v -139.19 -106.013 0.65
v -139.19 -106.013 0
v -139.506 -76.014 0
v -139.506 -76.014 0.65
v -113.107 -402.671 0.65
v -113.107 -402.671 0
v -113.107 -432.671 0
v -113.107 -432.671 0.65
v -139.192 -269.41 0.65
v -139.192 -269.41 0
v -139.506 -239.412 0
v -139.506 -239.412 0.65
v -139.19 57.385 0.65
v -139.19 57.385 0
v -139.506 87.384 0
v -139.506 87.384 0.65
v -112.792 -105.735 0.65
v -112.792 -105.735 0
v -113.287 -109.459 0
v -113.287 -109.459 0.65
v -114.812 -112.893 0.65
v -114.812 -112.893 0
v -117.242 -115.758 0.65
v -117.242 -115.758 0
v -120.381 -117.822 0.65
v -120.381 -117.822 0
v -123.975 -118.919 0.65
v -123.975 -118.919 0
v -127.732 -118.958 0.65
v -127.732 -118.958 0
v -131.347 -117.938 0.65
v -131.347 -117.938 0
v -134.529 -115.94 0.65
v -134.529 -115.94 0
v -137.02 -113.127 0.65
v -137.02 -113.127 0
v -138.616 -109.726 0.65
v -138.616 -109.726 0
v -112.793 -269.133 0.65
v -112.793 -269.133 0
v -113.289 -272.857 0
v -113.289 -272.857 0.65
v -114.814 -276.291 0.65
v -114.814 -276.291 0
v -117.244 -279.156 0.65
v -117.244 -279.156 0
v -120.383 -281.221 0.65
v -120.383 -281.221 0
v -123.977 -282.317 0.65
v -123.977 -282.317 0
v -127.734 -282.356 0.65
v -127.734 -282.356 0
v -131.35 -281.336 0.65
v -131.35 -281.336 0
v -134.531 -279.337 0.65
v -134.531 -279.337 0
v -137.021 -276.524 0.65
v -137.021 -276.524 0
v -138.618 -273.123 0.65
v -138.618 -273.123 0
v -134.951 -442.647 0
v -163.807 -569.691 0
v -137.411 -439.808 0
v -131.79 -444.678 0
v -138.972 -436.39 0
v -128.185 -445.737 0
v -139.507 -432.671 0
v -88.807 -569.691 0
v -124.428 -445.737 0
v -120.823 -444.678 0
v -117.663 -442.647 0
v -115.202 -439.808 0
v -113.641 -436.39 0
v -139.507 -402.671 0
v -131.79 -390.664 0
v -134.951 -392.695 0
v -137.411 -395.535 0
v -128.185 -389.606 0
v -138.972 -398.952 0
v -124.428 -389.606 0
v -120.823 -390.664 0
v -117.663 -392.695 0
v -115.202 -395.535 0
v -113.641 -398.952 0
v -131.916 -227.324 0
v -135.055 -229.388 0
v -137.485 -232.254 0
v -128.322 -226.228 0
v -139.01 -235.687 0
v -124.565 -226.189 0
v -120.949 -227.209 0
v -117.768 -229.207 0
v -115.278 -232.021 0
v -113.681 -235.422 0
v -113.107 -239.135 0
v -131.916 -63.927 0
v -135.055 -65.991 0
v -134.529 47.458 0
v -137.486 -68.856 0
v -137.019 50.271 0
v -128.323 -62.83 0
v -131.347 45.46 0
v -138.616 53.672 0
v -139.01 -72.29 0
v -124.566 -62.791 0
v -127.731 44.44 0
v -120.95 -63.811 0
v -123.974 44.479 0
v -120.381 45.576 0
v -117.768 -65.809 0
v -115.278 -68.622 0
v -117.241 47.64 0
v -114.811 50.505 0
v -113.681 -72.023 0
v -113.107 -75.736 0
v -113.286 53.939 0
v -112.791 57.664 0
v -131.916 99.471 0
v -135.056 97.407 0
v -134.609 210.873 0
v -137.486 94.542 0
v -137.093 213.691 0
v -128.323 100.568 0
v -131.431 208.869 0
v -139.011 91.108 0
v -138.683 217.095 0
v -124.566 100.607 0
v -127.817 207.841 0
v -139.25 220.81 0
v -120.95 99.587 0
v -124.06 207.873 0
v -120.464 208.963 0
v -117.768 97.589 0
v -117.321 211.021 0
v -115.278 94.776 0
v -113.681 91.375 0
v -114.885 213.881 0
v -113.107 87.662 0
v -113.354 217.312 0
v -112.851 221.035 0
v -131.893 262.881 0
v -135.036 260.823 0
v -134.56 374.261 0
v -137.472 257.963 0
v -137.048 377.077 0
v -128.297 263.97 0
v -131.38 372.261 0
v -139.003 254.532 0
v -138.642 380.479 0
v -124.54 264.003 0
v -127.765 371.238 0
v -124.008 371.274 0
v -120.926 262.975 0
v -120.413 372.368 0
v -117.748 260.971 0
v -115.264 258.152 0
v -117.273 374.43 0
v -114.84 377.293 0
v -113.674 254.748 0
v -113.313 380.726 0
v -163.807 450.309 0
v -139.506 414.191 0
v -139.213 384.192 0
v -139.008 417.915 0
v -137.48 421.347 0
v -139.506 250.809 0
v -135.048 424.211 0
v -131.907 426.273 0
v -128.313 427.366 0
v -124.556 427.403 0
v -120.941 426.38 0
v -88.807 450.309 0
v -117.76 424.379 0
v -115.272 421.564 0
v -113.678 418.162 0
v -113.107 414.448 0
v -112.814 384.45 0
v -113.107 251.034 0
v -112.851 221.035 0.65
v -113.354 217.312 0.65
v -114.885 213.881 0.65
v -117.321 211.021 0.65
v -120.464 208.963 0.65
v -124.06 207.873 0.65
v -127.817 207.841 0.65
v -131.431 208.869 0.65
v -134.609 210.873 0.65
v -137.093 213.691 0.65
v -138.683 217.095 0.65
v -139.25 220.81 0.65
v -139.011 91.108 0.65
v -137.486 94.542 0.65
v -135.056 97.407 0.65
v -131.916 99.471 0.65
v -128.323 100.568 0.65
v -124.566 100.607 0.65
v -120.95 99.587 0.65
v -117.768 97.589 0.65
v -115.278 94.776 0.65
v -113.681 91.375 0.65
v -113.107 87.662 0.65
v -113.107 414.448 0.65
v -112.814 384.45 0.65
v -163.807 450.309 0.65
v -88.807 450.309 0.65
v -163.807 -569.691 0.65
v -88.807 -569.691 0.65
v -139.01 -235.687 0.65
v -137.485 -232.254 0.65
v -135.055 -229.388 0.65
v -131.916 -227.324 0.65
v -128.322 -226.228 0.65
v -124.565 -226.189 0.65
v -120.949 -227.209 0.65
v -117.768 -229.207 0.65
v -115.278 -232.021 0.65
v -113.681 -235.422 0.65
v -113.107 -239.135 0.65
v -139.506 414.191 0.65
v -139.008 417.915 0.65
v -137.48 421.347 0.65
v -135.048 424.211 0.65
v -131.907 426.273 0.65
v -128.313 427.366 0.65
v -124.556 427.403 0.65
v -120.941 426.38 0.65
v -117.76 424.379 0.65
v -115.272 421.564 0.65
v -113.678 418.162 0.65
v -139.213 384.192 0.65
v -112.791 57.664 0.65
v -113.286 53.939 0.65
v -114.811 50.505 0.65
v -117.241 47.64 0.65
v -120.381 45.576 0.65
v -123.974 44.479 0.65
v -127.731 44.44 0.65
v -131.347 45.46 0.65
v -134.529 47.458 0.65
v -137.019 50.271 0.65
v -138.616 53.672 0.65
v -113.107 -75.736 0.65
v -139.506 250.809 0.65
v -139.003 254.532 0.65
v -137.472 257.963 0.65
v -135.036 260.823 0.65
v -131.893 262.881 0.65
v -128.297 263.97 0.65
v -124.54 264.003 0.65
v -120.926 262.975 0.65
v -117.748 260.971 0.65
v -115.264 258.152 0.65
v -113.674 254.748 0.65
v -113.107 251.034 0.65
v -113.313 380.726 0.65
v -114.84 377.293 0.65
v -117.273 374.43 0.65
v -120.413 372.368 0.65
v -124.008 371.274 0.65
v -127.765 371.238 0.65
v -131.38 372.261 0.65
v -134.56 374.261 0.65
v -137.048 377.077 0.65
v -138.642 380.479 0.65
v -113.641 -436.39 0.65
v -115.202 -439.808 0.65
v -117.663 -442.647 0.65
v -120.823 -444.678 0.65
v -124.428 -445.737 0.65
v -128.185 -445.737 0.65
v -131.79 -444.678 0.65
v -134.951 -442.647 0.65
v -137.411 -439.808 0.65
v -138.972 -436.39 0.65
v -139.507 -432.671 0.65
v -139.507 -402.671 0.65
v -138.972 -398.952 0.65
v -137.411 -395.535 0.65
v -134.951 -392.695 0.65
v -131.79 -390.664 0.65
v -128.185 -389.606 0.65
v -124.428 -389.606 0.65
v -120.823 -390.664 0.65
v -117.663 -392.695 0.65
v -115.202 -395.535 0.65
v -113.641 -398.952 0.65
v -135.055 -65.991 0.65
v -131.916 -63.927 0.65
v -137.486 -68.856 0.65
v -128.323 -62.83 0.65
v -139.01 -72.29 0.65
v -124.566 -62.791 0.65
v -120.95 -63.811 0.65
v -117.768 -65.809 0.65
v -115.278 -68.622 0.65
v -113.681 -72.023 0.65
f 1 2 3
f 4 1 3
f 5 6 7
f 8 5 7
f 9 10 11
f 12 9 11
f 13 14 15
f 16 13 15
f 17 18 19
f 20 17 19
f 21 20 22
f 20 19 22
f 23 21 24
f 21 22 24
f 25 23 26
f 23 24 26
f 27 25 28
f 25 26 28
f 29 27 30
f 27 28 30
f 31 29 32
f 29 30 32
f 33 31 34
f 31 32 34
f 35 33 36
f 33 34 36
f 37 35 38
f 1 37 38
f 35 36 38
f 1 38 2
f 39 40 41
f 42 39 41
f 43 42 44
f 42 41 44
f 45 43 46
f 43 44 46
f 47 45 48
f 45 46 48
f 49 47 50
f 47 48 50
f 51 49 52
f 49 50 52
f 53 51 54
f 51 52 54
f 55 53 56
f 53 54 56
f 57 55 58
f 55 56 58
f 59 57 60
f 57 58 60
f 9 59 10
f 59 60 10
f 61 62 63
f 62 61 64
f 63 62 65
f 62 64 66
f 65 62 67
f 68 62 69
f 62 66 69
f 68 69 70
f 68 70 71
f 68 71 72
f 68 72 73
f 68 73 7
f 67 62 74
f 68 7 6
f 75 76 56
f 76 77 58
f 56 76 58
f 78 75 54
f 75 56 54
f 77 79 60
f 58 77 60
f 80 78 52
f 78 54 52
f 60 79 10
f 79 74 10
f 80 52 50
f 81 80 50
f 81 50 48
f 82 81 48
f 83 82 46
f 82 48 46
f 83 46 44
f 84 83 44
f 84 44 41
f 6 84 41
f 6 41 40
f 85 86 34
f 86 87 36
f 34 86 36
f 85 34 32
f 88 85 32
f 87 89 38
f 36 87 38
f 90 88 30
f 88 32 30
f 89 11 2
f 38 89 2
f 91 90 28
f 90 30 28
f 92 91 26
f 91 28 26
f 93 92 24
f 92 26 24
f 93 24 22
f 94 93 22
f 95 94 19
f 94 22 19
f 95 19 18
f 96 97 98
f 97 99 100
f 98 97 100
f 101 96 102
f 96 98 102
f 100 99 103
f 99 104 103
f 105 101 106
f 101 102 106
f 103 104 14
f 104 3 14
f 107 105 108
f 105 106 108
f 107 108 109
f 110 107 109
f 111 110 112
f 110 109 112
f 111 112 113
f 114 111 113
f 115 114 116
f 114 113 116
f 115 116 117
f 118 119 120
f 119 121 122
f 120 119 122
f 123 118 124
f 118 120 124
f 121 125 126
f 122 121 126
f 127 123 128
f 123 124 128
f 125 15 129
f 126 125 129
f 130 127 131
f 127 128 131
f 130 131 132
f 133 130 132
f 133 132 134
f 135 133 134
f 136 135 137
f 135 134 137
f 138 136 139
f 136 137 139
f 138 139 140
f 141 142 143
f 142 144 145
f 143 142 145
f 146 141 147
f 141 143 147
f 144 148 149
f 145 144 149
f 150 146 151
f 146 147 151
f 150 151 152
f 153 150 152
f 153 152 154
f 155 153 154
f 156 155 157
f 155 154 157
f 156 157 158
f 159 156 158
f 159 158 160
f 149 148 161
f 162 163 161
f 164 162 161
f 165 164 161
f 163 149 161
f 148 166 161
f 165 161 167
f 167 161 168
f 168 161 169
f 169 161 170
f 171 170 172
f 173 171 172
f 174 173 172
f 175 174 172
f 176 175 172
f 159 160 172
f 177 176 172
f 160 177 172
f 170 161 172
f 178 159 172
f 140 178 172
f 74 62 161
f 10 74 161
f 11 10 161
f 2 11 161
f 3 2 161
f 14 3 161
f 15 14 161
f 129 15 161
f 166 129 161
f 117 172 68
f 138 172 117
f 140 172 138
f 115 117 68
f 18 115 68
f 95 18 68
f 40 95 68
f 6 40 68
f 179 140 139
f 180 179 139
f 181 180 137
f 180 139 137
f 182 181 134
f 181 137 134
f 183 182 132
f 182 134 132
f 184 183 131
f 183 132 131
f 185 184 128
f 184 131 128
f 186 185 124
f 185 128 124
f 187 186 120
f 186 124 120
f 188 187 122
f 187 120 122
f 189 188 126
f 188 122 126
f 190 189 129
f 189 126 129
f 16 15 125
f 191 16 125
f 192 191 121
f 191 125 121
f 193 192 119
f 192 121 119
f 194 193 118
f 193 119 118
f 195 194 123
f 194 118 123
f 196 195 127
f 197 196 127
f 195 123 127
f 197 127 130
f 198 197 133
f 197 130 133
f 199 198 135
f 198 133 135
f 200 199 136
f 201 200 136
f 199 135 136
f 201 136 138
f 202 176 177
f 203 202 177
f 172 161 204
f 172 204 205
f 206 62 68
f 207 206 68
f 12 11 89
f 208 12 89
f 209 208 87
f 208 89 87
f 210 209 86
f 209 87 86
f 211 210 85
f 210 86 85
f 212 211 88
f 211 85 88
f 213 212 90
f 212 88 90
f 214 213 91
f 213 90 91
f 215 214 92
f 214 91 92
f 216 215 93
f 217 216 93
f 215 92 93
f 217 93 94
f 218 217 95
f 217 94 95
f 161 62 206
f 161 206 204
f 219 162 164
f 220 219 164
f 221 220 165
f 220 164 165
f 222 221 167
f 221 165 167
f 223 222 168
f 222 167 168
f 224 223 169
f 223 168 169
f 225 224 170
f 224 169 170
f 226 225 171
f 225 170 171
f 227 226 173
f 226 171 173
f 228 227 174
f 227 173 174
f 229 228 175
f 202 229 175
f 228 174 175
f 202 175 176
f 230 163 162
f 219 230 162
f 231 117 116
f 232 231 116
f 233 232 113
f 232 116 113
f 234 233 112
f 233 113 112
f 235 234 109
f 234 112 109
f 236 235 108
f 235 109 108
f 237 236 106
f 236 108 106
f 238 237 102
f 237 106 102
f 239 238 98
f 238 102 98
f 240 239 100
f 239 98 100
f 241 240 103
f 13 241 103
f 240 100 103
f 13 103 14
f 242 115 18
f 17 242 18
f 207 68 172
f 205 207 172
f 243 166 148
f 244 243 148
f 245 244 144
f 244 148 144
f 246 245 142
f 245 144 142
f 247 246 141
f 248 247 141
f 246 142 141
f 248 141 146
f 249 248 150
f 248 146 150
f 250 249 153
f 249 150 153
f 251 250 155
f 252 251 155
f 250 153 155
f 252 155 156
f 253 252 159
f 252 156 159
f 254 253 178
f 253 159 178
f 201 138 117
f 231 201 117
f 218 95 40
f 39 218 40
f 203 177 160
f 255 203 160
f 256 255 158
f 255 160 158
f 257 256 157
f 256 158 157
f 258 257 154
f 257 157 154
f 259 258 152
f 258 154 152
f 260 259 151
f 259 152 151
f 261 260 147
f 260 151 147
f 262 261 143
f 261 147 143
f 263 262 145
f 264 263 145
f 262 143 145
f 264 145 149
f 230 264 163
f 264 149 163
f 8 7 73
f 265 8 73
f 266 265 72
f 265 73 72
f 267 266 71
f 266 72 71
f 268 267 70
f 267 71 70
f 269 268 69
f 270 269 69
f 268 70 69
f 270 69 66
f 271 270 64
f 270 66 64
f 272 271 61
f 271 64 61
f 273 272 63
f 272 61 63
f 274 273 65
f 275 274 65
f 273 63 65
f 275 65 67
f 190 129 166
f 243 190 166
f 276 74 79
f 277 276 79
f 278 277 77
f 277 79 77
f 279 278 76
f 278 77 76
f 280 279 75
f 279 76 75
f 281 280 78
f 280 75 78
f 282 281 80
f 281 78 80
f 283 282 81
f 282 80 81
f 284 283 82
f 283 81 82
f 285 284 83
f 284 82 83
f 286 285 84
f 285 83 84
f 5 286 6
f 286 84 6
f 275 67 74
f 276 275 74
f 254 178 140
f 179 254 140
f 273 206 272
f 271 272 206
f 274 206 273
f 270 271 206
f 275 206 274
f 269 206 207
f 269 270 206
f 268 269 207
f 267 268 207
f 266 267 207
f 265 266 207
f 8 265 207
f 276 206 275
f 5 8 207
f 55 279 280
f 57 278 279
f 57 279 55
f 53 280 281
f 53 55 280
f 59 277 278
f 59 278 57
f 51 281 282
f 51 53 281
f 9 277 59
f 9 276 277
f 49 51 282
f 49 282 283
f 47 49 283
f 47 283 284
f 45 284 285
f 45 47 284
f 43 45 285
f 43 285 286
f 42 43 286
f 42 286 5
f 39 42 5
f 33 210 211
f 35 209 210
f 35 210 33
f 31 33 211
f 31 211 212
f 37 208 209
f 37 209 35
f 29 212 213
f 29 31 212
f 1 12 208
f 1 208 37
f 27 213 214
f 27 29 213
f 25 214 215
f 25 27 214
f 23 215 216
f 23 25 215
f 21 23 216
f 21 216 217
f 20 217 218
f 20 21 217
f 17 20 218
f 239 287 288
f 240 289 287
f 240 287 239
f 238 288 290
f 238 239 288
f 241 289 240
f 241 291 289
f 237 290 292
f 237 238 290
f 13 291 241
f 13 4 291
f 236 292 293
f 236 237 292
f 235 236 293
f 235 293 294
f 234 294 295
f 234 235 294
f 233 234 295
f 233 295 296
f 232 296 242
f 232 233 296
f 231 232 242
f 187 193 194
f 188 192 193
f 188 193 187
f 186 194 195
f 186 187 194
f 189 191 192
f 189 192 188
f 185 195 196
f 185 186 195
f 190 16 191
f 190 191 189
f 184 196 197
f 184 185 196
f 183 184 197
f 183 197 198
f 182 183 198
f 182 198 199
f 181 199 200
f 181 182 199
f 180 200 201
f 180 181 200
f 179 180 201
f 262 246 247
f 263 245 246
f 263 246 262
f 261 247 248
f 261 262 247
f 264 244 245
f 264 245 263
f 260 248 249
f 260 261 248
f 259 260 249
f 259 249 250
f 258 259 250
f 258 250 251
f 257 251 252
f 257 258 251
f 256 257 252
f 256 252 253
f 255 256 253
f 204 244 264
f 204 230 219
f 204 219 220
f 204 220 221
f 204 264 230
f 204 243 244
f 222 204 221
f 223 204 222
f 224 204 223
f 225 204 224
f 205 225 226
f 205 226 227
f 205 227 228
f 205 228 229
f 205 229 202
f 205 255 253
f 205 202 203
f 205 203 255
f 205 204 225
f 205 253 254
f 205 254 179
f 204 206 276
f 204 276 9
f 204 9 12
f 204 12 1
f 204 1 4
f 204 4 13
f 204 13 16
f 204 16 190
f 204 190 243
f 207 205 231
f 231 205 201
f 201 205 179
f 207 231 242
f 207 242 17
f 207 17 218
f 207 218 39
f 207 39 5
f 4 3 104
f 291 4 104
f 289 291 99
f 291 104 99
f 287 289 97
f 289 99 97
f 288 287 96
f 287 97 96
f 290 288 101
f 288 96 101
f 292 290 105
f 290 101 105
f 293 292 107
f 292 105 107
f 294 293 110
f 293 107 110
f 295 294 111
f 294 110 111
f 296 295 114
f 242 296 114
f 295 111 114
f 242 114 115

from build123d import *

# Parameters (mm, degrees)
F0_W     = 75
F0_H     = 1020
F1_DEPTH = 0.65


# Not quite as in the source:
# - ends of sketch curves that miss each other by under 0.0002 mm in the source are joined


with BuildPart() as f1:
    # F0 (on Top) → F1 (new body)
    with BuildSketch(Plane.XY):
        with Locations((-126.3066948975, -59.6911867905)):
            Rectangle(F0_W, F0_H)
        with BuildLine():
            ThreePointArc((-113.1066948975, -432.6711867905), (-126.3066948975, -445.8711867905), (-139.5066948975, -432.6711867905))
            Line((-139.5066948975, -432.6711867905), (-139.5066948975, -402.6711867905))
            ThreePointArc((-139.5066948975, -402.6711867905), (-126.3066948975, -389.4711867905), (-113.1066948975, -402.6711867905))
            Line((-113.1066948975, -402.6711867905), (-113.1066948975, -432.6711867905))
        make_face(mode=Mode.SUBTRACT)
        with BuildLine():
            ThreePointArc((-139.5059699251, -239.411547845), (-126.4450377578, -226.0739299572), (-113.10741987, -239.1348621245))
            Line((-113.10741987, -239.1348621245), (-112.7930042784, -269.1332144598))
            ThreePointArc((-112.7930042784, -269.1332144598), (-125.8539364457, -282.4708323476), (-139.1915543335, -269.4099001804))
            Line((-139.1915543335, -269.4099001804), (-139.5059699251, -239.411547845))
        make_face(mode=Mode.SUBTRACT)
        with BuildLine():
            ThreePointArc((-139.5059629442, -76.0142499203), (-126.4457022055, -62.6759745657), (-113.1074268508, -75.7362353044))
            Line((-113.1074268508, -75.7362353044), (-112.7915011509, -105.7345717742))
            ThreePointArc((-112.7915011509, -105.7345717742), (-125.8517618897, -119.0728471288), (-139.1900372443, -106.0125863901))
            Line((-139.1900372443, -106.0125863901), (-139.5059629442, -76.0142499203))
        make_face(mode=Mode.SUBTRACT)
        with BuildLine():
            ThreePointArc((-139.505960843, 87.3835072291), (-126.4459015791, 100.7219798561), (-113.107428952, 87.6619205922))
            Line((-113.107428952, 87.6619205922), (-112.7910501303, 57.6635888979))
            ThreePointArc((-112.7910501303, 57.6635888979), (-125.8511093943, 44.3251162708), (-139.1895820213, 57.3851755348))
            Line((-139.1895820213, 57.3851755348), (-139.505960843, 87.3835072291))
        make_face(mode=Mode.SUBTRACT)
        with BuildLine():
            ThreePointArc((-139.5062126227, 250.8085359622), (-126.4195302765, 264.1208890664), (-113.1071771723, 251.0342067202))
            Line((-113.1071771723, 251.0342067202), (-112.8507331291, 221.0353027993))
            ThreePointArc((-112.8507331291, 221.0353027993), (-125.9374154753, 207.7229496952), (-139.2497685795, 220.8096320413))
            Line((-139.2497685795, 220.8096320413), (-139.5062126227, 250.8085359622))
        make_face(mode=Mode.SUBTRACT)
        with BuildLine():
            ThreePointArc((-139.5060659261, 414.1907621397), (-126.4355531533, 427.5189914241), (-113.1073238689, 414.4484786514))
            Line((-113.1073238689, 414.4484786514), (-112.8144641966, 384.4499081319))
            ThreePointArc((-112.8144641966, 384.4499081319), (-125.8849769693, 371.1216788475), (-139.2132062537, 384.1921916203))
            Line((-139.2132062537, 384.1921916203), (-139.5060659261, 414.1907621397))
        make_face(mode=Mode.SUBTRACT)
    extrude(amount=F1_DEPTH)


solid = f1.part
